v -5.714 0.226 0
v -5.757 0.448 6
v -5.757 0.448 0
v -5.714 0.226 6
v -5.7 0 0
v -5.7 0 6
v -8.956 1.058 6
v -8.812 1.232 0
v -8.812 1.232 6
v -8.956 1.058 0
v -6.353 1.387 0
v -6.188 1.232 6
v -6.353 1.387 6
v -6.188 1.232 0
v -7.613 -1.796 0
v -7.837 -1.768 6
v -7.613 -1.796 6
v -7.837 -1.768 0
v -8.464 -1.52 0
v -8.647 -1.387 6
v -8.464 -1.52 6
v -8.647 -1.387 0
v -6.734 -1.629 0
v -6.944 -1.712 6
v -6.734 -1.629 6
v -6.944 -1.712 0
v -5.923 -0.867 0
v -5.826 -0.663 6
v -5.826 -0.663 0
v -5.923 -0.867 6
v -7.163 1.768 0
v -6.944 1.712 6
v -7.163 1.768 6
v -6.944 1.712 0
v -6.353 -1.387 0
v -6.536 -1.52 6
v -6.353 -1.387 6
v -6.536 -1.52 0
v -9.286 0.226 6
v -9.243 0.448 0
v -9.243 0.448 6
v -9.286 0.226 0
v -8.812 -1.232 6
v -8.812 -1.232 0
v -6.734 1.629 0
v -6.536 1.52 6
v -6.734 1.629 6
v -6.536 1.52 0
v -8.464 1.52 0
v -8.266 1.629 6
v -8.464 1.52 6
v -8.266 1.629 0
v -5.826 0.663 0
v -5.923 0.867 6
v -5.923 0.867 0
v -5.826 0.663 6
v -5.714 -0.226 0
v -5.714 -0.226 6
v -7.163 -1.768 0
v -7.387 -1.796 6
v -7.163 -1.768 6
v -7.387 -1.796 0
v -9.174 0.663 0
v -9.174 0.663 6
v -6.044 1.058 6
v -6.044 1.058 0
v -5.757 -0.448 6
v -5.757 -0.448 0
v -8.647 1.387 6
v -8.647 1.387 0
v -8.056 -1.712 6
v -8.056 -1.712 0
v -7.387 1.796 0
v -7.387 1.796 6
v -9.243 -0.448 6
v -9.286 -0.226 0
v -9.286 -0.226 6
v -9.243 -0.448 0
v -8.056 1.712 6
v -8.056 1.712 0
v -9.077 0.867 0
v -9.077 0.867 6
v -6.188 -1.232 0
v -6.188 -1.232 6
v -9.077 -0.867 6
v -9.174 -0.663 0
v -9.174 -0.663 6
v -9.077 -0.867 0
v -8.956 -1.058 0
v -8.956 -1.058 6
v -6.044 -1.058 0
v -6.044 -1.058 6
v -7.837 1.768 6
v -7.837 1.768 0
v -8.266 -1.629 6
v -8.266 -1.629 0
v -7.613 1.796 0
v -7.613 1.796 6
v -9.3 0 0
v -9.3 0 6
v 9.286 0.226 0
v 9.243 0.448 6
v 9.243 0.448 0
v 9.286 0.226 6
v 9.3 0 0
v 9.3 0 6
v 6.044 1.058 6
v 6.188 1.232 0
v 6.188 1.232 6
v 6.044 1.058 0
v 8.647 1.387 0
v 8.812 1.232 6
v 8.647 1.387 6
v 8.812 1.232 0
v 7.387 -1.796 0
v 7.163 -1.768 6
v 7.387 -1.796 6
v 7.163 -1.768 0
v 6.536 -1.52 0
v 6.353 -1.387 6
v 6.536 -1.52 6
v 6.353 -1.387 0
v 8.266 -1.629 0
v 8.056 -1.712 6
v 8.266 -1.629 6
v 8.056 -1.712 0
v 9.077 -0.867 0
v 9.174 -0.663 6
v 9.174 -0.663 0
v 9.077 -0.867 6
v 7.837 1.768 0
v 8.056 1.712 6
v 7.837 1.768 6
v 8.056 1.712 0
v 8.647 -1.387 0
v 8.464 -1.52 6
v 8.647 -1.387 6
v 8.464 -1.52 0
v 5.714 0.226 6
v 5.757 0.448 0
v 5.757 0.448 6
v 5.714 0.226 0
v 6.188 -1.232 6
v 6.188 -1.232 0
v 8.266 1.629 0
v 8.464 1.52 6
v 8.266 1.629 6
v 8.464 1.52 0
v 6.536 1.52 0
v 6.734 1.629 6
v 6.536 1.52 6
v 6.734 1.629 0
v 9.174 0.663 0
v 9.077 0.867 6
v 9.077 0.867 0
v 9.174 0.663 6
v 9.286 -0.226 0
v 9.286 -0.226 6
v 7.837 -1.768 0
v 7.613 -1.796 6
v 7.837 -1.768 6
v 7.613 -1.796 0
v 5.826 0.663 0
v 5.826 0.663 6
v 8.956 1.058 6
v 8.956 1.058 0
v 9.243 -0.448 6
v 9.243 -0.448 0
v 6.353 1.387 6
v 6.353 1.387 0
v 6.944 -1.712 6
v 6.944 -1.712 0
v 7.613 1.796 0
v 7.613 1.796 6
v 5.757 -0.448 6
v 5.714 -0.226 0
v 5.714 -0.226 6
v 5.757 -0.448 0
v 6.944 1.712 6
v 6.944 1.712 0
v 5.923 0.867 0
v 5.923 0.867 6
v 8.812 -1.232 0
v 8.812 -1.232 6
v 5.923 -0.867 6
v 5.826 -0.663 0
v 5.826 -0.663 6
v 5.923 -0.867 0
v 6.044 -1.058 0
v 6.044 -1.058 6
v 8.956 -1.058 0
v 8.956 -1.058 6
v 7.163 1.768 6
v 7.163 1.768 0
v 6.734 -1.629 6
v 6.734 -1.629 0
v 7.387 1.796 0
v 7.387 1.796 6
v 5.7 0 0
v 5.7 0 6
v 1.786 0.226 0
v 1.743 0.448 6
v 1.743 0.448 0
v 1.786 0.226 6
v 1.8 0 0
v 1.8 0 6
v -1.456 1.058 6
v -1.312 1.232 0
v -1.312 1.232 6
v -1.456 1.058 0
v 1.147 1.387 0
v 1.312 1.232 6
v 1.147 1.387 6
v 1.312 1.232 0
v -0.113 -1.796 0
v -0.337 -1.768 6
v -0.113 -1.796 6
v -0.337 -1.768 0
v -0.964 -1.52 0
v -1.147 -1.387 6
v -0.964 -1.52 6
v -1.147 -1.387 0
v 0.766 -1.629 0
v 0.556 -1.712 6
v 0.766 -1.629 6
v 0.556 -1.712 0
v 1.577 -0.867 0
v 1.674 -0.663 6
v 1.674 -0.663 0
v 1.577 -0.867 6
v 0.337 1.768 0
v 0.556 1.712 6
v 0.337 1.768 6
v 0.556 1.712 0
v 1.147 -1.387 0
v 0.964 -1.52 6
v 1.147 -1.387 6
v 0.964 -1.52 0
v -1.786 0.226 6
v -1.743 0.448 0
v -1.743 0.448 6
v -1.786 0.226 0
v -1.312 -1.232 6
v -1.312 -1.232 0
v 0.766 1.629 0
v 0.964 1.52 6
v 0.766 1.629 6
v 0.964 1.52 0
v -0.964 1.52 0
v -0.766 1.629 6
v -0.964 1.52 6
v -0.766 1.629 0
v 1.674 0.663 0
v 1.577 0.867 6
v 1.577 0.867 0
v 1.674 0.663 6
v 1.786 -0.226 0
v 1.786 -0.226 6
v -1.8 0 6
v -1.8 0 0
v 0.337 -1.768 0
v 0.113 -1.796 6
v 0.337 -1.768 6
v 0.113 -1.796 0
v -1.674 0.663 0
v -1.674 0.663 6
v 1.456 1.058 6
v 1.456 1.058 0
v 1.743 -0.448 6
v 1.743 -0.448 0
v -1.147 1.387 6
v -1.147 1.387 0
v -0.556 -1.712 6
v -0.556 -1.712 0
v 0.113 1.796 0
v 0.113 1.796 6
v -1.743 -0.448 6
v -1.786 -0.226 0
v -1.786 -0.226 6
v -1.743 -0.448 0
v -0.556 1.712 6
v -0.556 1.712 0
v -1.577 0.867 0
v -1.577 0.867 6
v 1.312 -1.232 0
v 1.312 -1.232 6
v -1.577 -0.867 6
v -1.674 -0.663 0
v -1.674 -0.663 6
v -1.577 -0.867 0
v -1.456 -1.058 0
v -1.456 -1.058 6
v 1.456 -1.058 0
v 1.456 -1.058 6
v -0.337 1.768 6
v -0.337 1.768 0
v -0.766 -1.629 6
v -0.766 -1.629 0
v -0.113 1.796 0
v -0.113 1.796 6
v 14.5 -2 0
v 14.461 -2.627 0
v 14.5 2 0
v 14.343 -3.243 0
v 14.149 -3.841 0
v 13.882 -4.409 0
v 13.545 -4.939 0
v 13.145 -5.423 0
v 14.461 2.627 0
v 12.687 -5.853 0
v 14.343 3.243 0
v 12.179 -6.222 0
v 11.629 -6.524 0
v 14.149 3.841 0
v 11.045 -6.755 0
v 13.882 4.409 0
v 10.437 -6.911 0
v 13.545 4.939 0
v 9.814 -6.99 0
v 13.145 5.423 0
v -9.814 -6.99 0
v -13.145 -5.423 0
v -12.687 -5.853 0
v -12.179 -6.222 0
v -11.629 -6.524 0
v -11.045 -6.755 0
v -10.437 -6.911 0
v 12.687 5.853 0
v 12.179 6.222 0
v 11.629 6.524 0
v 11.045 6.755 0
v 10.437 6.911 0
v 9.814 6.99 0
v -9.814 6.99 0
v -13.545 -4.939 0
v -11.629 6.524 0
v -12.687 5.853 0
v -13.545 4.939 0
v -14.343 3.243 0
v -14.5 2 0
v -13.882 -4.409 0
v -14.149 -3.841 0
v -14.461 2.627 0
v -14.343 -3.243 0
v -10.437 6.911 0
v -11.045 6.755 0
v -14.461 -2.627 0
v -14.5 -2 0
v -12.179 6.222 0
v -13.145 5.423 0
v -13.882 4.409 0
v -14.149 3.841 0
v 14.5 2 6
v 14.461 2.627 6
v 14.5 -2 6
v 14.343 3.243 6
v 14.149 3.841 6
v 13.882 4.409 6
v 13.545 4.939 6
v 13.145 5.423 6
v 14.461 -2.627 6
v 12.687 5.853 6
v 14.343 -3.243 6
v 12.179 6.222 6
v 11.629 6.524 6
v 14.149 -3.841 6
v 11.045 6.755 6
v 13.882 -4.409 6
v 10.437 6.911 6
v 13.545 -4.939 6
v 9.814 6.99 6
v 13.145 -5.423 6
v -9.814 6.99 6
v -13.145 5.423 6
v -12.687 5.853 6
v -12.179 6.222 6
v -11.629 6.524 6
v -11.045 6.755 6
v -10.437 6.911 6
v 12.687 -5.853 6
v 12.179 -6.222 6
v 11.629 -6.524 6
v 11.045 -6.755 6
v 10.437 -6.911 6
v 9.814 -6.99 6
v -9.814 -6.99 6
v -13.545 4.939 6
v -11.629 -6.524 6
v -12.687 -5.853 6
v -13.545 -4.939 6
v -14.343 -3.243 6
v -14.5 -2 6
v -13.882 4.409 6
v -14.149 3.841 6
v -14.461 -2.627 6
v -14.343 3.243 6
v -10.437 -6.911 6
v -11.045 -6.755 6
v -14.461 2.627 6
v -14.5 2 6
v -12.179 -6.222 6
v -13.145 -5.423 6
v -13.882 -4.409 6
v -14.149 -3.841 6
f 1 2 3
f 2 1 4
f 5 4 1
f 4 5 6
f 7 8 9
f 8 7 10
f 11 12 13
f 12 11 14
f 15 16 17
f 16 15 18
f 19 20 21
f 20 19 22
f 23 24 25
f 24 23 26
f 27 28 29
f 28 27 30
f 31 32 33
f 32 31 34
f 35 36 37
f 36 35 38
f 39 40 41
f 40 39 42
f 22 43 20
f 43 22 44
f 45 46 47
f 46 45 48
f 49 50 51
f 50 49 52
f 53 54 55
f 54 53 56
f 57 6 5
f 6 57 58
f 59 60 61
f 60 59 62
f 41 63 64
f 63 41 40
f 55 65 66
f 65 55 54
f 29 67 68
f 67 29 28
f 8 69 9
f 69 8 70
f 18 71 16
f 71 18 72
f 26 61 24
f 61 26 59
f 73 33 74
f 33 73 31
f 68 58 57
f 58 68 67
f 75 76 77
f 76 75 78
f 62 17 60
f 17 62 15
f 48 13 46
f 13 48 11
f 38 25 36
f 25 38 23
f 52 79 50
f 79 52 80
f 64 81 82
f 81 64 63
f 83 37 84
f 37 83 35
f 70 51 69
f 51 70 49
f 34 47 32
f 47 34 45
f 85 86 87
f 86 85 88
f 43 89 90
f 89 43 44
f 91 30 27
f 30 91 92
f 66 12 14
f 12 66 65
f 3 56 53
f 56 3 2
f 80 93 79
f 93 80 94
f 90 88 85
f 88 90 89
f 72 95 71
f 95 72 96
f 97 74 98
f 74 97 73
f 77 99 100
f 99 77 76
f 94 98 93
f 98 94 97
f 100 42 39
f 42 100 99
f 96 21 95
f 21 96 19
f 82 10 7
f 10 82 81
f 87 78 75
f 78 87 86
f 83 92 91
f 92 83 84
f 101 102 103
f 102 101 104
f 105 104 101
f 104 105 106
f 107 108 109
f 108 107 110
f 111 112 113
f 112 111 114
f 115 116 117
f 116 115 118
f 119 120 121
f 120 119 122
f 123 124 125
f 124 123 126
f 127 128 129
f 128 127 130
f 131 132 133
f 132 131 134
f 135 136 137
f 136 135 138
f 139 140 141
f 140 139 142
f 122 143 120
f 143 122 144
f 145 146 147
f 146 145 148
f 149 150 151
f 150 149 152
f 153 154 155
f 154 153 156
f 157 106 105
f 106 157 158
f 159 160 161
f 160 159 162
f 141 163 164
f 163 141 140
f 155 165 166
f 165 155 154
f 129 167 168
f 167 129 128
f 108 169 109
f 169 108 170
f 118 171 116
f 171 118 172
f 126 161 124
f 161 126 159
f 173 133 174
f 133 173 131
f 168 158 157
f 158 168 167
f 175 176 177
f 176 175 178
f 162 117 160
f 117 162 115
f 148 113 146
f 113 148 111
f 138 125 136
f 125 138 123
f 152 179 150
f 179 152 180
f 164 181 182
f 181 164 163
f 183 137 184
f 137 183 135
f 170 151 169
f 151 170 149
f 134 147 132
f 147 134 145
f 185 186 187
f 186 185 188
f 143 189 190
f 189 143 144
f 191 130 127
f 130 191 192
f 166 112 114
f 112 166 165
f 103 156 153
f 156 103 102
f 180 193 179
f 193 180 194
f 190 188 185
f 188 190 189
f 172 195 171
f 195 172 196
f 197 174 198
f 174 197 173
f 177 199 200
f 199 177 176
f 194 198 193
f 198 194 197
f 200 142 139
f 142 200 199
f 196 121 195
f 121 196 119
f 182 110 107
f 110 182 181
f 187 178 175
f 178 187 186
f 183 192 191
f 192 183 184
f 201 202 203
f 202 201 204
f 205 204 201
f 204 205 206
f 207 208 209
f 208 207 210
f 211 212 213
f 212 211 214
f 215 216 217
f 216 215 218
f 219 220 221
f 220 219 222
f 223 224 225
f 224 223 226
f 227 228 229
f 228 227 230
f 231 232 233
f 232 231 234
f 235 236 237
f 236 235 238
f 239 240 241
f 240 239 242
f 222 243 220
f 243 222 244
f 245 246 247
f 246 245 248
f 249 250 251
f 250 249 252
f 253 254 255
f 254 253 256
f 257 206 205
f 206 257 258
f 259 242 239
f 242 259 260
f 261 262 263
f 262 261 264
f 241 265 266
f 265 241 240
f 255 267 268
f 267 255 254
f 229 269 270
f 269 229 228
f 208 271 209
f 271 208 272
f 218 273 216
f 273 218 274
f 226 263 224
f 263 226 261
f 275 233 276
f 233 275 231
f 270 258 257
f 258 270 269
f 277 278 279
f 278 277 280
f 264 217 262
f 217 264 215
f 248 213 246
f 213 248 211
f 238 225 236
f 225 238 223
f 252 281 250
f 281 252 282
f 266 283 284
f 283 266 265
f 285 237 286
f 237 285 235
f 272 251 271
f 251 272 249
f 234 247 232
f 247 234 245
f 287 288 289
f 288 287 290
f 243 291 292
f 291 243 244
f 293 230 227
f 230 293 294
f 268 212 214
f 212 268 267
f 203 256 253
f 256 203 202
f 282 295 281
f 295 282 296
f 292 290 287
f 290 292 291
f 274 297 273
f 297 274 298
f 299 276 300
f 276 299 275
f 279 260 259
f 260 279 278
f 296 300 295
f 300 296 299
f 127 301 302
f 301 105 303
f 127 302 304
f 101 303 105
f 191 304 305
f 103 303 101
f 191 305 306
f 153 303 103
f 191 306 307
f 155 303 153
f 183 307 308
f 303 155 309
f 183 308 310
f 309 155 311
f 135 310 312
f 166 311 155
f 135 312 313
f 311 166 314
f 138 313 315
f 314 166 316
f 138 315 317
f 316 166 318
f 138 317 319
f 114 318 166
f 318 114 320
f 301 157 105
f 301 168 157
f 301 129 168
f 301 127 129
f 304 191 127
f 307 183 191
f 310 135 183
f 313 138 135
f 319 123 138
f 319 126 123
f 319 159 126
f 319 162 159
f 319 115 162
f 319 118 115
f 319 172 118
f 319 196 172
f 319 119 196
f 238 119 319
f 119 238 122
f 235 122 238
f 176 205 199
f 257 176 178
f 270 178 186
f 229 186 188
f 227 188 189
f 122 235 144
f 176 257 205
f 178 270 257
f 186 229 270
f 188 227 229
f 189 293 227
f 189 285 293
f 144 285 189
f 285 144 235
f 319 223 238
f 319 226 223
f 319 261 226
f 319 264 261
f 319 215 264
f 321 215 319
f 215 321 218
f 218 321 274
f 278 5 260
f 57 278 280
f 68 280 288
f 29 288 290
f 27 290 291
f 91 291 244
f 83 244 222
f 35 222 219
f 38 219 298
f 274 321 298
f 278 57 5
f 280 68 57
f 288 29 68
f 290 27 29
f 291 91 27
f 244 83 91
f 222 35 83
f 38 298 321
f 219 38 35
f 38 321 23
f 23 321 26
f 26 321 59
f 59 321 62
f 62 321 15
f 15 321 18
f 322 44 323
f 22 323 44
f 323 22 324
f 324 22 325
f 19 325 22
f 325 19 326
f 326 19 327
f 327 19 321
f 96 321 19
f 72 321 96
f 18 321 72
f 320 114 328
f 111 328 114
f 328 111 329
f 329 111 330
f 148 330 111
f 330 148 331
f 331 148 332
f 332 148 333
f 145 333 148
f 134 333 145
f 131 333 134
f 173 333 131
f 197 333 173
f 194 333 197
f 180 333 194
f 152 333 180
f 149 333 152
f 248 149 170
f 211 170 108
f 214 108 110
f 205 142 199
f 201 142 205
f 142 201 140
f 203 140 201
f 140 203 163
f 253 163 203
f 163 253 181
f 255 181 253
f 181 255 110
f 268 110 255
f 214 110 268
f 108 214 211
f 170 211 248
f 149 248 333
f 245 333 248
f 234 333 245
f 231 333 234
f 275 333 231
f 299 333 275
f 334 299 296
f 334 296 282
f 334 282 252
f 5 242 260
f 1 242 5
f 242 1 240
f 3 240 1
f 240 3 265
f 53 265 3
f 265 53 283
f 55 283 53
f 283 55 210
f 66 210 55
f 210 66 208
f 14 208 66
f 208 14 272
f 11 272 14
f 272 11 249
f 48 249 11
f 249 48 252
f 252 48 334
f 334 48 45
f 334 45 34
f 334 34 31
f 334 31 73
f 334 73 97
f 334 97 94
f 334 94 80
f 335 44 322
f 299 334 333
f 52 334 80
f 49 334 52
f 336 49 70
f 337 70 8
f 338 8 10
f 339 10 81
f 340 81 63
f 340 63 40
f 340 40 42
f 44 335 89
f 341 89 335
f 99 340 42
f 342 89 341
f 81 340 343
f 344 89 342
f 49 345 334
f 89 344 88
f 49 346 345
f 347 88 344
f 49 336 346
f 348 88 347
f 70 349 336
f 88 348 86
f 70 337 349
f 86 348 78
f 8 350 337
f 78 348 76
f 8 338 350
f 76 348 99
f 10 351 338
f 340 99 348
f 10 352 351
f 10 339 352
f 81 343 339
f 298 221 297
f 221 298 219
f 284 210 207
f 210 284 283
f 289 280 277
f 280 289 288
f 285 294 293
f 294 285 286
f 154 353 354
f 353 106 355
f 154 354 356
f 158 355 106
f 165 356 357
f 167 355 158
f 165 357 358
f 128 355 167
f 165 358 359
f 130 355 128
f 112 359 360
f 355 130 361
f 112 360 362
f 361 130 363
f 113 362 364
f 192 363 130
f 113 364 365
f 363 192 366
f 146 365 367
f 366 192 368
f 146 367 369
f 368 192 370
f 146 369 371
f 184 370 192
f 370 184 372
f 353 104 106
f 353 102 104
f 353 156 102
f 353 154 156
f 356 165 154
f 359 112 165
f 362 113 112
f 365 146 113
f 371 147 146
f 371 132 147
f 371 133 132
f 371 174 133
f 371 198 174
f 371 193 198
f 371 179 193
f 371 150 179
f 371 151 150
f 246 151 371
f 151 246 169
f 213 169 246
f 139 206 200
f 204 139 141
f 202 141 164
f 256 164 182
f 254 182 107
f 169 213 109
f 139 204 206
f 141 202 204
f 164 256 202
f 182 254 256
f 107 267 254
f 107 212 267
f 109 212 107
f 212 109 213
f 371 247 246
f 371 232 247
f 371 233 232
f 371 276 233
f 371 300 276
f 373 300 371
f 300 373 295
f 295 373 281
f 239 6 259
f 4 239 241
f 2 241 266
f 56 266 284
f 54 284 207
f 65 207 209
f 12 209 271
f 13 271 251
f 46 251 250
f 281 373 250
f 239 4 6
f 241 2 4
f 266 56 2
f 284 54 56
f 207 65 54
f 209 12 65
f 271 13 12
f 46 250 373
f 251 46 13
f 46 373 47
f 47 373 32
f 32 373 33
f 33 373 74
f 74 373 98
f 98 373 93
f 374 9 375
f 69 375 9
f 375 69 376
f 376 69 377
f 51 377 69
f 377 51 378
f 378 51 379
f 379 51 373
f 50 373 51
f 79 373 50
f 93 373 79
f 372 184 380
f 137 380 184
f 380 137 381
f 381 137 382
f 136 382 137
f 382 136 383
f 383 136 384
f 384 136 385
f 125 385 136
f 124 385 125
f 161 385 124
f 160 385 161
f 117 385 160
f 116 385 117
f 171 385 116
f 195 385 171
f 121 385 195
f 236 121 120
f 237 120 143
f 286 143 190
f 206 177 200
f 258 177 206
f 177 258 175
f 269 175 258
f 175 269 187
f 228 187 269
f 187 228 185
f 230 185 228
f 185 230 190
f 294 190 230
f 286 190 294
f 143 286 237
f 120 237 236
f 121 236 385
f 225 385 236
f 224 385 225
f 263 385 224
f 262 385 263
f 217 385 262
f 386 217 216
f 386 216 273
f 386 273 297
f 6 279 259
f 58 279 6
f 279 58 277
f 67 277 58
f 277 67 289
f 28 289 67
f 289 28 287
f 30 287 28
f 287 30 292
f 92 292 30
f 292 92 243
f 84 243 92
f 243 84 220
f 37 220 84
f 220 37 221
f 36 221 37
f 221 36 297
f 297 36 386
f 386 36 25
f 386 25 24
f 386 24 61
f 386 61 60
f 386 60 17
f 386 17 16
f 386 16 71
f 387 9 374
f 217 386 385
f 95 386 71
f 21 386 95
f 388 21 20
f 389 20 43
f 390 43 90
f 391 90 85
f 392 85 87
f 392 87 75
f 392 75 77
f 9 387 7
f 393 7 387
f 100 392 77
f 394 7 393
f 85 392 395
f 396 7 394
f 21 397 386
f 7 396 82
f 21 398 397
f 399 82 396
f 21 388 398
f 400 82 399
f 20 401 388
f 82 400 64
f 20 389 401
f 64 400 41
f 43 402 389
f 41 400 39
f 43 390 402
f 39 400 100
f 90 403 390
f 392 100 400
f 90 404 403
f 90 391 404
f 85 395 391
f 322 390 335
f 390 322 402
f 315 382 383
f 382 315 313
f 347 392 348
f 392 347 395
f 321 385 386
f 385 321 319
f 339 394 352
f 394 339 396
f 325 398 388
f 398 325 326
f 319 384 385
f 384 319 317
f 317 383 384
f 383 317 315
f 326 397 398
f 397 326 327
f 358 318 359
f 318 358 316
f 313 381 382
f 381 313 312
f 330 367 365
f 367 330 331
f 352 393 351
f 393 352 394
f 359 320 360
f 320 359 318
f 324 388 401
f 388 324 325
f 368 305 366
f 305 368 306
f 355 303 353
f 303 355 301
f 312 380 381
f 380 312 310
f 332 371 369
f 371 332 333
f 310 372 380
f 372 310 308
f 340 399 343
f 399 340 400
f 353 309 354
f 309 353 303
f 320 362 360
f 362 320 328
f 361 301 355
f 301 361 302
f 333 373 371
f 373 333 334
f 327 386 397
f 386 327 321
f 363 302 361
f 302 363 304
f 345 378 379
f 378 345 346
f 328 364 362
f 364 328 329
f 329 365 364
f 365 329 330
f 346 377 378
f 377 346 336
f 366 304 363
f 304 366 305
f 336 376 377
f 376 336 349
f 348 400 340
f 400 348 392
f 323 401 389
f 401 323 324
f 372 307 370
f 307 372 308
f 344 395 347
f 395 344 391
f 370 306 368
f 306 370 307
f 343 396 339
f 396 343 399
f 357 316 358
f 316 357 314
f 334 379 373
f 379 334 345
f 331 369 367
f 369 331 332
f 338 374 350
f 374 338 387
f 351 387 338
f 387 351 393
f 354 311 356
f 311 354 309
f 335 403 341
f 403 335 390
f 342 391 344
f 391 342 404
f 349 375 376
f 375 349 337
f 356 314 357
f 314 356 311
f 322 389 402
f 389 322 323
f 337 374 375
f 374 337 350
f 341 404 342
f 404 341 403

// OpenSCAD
$fn = 50;


difference() {
	union() {
		hull() {
			translate(v = [-9.5000000000, 2.0000000000, 0]) {
				cylinder(h = 6, r = 5);
			}
			translate(v = [9.5000000000, 2.0000000000, 0]) {
				cylinder(h = 6, r = 5);
			}
			translate(v = [-9.5000000000, -2.0000000000, 0]) {
				cylinder(h = 6, r = 5);
			}
			translate(v = [9.5000000000, -2.0000000000, 0]) {
				cylinder(h = 6, r = 5);
			}
		}
	}
	union() {
		translate(v = [-7.5000000000, 0.0000000000, -100.0000000000]) {
			cylinder(h = 200, r = 1.8000000000);
		}
		translate(v = [7.5000000000, 0.0000000000, -100.0000000000]) {
			cylinder(h = 200, r = 1.8000000000);
		}
		translate(v = [-7.5000000000, 0.0000000000, 0]) {
			cylinder(h = 6, r = 1.8000000000);
		}
		cylinder(h = 6, r = 1.8000000000);
		translate(v = [7.5000000000, 0.0000000000, 0]) {
			cylinder(h = 6, r = 1.8000000000);
		}
		translate(v = [-7.5000000000, 0.0000000000, 0]) {
			cylinder(h = 6, r = 1.8000000000);
		}
		cylinder(h = 6, r = 1.8000000000);
		translate(v = [7.5000000000, 0.0000000000, 0]) {
			cylinder(h = 6, r = 1.8000000000);
		}
		translate(v = [-7.5000000000, 0.0000000000, 0]) {
			cylinder(h = 6, r = 1.8000000000);
		}
		cylinder(h = 6, r = 1.8000000000);
		translate(v = [7.5000000000, 0.0000000000, 0]) {
			cylinder(h = 6, r = 1.8000000000);
		}
	}
}
